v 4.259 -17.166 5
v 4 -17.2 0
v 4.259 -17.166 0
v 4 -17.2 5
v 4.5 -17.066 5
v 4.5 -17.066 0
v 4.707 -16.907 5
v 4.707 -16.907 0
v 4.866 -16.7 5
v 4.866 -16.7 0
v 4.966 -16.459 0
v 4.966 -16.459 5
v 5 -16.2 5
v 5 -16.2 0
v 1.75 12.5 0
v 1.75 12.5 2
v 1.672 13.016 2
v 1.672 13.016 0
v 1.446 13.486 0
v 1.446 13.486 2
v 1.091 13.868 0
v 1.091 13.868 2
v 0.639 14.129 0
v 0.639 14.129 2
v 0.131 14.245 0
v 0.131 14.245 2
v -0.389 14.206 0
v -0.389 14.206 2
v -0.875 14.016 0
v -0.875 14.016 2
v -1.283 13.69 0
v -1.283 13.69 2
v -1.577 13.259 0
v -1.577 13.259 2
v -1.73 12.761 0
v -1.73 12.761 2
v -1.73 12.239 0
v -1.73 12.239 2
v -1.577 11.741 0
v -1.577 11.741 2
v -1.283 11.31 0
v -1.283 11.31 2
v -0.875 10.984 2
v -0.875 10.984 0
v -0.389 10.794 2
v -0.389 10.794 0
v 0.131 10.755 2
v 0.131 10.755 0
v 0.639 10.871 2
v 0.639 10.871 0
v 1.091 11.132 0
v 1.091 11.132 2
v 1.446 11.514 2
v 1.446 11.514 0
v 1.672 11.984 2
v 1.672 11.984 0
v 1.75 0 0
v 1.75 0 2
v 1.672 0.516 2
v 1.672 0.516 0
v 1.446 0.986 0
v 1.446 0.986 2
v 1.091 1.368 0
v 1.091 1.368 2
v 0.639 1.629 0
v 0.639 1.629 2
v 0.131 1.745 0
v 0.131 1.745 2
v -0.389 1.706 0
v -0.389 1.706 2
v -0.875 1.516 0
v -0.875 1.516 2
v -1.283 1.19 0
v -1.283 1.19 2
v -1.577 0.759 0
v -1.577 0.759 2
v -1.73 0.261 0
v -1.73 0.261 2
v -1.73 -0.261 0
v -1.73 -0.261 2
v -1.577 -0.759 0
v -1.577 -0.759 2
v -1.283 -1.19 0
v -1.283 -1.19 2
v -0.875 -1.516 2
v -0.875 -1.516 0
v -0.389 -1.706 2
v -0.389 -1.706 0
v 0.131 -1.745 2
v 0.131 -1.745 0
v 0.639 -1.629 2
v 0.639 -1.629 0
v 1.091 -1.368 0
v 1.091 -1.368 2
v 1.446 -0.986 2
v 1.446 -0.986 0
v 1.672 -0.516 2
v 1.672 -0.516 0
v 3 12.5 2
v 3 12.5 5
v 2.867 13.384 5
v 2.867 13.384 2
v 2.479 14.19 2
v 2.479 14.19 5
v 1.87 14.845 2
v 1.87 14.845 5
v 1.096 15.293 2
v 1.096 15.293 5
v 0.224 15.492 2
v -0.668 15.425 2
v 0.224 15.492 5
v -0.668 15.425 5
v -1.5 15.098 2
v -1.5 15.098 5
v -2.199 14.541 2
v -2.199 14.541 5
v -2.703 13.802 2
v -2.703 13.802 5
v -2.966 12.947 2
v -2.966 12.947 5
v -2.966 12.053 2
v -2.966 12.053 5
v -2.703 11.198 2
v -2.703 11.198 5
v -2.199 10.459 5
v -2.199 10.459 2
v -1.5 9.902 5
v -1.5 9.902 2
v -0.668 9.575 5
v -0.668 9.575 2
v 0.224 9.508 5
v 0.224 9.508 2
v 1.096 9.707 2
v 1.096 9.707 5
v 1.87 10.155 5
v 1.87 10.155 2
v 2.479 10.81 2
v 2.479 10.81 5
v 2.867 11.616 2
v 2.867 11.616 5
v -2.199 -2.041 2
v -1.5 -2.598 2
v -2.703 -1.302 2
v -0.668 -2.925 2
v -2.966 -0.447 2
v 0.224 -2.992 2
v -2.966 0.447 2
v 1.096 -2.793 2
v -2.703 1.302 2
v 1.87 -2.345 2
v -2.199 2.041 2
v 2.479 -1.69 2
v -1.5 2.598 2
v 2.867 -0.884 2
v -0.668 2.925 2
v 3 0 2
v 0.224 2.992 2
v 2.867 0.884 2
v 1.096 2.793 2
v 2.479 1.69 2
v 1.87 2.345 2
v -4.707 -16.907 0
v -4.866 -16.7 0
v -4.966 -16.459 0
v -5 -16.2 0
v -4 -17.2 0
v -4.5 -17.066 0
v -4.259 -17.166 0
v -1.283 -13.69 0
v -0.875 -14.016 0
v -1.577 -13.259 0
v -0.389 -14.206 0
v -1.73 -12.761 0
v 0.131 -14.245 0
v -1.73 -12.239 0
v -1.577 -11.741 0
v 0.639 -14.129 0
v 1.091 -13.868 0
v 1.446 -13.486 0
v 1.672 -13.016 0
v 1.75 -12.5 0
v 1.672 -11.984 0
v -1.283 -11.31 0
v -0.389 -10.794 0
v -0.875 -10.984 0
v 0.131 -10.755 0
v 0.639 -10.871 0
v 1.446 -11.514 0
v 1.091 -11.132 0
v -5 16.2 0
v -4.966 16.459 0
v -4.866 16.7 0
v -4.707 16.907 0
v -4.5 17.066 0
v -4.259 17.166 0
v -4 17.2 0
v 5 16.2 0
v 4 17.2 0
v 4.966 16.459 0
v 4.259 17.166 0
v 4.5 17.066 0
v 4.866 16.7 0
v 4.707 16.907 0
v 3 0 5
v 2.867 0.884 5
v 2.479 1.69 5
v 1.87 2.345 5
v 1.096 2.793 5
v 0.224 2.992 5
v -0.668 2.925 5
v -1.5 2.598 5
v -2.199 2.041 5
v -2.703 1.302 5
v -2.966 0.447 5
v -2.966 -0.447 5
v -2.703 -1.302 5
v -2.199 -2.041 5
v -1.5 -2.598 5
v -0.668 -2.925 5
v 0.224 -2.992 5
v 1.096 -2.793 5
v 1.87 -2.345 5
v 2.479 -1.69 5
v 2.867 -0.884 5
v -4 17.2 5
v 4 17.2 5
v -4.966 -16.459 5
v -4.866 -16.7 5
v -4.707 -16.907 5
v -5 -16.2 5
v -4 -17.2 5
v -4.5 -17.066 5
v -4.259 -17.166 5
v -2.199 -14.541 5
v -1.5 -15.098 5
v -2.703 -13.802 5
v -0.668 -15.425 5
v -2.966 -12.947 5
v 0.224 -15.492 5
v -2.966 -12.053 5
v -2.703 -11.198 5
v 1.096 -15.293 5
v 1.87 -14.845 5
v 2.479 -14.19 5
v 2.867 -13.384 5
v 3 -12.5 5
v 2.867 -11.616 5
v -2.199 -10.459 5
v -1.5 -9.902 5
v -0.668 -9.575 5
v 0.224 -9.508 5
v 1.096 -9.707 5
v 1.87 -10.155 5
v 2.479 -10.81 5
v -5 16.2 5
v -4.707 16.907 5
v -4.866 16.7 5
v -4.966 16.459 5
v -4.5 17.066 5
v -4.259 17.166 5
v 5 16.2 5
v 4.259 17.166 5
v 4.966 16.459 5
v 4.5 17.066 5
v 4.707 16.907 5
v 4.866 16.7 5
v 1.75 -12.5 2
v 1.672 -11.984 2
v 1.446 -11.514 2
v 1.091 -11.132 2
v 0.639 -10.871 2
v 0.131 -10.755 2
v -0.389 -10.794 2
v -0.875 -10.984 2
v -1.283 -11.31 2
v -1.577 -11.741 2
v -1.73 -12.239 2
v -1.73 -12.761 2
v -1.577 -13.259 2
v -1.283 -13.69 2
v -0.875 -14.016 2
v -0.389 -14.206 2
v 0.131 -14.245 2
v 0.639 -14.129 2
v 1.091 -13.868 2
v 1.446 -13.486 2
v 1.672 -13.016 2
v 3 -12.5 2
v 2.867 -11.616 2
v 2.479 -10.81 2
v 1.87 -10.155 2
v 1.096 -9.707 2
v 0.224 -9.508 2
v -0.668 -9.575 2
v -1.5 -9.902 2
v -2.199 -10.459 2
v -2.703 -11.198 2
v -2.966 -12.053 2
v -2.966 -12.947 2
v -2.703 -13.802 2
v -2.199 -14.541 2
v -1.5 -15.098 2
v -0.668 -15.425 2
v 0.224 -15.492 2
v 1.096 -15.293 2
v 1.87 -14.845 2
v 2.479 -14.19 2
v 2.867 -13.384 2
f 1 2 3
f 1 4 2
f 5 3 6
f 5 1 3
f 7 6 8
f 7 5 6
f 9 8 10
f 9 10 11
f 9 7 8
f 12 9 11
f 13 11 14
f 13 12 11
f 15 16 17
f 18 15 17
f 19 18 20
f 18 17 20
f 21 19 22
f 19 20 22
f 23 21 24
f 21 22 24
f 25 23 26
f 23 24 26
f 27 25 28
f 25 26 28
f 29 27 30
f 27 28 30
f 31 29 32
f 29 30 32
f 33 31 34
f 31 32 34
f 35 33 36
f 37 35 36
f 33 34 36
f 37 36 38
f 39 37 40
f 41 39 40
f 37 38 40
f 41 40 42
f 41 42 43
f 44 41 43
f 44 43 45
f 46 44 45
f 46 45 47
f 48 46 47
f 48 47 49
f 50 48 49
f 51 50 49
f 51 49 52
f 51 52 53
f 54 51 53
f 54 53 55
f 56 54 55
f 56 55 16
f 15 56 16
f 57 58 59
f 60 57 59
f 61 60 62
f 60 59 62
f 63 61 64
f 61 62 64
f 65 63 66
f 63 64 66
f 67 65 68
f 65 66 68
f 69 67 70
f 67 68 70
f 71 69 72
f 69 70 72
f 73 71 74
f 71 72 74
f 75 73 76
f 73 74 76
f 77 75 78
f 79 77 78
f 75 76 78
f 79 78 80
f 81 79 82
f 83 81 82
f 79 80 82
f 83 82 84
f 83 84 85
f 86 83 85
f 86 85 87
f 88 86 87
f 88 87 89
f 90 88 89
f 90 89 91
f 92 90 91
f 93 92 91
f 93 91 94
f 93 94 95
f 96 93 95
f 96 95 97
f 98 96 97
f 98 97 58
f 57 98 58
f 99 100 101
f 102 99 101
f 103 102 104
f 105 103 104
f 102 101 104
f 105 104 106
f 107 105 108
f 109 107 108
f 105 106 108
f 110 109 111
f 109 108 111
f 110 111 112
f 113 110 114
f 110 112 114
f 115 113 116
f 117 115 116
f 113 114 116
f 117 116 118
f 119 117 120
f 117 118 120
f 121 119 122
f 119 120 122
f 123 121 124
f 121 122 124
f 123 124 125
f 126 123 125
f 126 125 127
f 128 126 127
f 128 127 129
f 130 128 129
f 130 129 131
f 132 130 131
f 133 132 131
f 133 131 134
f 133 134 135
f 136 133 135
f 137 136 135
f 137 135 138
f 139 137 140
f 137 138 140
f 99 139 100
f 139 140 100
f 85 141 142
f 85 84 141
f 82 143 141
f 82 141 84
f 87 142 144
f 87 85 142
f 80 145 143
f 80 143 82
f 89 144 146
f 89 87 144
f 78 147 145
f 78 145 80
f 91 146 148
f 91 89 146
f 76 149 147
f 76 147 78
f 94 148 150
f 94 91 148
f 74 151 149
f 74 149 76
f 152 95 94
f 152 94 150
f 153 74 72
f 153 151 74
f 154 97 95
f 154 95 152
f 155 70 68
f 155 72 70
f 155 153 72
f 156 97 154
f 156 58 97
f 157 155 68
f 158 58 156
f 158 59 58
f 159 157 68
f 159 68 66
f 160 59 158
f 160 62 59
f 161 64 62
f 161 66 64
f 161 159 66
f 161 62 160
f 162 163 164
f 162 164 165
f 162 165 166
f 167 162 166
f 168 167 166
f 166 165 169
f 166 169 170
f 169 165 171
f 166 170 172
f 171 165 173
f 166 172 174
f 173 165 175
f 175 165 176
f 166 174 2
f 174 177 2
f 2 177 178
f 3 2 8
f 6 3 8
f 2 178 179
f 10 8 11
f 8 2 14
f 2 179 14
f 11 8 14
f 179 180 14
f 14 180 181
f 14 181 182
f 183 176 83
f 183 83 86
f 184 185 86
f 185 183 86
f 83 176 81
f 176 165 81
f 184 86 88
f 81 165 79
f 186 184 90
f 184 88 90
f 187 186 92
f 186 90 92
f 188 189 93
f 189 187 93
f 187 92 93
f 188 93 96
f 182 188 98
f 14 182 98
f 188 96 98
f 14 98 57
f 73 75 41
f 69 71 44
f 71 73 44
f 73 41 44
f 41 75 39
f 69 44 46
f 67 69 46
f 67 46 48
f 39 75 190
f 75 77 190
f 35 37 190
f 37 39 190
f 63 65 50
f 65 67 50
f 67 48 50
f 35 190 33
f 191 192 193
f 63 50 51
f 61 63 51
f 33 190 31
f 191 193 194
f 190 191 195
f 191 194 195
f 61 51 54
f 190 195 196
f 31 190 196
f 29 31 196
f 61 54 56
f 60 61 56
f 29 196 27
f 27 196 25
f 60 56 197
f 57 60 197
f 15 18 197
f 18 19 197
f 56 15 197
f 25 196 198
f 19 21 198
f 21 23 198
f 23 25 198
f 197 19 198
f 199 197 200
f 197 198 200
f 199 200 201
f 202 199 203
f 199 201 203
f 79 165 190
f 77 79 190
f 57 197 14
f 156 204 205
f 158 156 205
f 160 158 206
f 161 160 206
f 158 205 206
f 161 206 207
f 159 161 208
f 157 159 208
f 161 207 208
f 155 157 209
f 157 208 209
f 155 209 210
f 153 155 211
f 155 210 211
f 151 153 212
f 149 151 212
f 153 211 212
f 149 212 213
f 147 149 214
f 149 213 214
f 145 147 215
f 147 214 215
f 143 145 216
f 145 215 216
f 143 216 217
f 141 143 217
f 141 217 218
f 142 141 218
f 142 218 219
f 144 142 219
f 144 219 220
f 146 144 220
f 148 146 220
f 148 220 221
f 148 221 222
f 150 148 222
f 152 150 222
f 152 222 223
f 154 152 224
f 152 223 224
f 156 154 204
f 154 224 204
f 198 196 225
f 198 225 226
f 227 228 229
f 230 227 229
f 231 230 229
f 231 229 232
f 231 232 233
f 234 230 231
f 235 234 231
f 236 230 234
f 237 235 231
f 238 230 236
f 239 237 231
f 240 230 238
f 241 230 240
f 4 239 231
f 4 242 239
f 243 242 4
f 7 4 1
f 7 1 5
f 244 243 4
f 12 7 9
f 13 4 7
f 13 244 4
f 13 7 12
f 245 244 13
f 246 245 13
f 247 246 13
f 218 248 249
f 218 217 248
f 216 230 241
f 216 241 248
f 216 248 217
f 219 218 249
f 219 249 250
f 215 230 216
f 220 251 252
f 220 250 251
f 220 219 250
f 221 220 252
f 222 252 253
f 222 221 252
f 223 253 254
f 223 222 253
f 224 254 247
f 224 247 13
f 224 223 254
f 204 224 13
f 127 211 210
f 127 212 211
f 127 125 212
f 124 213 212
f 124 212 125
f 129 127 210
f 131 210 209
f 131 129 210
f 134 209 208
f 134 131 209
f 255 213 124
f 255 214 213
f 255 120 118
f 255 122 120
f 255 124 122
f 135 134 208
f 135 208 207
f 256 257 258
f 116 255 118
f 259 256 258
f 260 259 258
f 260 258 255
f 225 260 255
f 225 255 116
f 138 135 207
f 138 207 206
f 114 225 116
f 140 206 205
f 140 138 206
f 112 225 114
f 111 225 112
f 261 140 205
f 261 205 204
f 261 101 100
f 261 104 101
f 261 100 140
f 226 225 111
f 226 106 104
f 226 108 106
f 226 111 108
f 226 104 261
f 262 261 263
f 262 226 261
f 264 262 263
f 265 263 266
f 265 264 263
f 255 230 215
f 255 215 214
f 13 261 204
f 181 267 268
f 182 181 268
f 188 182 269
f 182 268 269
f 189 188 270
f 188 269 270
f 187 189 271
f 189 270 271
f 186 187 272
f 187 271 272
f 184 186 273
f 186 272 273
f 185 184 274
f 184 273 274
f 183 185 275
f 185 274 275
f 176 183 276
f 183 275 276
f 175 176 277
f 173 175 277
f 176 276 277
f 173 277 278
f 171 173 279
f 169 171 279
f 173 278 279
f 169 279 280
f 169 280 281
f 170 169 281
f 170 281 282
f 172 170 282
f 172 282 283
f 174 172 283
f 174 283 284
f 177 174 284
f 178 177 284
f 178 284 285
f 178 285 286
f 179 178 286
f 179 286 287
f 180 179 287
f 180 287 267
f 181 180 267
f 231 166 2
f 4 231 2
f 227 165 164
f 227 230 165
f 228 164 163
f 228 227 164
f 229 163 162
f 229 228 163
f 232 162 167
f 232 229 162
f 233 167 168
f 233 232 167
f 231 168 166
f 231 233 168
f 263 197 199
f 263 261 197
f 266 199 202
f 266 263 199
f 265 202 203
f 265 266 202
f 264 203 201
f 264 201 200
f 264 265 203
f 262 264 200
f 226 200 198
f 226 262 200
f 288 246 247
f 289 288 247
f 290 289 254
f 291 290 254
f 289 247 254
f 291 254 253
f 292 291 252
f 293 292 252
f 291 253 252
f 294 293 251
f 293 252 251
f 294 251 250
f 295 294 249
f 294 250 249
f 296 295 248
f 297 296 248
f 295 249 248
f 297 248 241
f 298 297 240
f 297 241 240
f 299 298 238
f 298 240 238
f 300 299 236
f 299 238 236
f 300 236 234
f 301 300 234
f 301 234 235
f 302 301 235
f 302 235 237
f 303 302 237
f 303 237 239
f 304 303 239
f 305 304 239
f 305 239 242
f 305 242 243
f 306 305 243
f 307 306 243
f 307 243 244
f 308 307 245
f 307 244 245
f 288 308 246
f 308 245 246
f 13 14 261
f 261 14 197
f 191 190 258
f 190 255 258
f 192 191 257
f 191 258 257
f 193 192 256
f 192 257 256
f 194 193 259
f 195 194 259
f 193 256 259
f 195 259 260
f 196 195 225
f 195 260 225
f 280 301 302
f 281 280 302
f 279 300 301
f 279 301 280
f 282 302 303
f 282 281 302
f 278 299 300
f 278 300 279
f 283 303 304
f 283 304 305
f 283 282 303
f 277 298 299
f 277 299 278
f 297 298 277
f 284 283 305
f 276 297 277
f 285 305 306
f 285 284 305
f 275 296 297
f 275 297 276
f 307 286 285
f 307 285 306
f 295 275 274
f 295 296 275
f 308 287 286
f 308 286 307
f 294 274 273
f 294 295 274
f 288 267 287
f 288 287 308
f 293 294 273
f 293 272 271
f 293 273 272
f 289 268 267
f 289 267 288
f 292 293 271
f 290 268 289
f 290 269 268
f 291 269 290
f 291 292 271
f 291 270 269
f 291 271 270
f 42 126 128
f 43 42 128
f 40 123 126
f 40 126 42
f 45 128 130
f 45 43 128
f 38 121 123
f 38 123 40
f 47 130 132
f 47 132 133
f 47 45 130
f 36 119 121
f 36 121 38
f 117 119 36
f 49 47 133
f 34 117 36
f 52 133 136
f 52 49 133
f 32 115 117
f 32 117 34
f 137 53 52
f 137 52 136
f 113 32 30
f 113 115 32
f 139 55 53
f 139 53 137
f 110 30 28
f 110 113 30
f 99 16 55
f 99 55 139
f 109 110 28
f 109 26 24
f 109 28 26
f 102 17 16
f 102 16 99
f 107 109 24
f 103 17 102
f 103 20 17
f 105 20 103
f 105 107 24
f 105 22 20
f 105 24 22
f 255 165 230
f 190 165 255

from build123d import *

# Parameters (mm, degrees)
SKETCH1_W           = 10
SKETCH1_H           = 34.4
BOSS_EXTRUDE1_DEPTH = 5
FILLET1_R           = 1
SKETCH4_R           = 1.75
CUT_EXTRUDE1_DEPTH  = 5
SKETCH5_R           = 3
CUT_EXTRUDE2_DEPTH  = 3


with BuildPart() as part:
    # Sketch1 → Boss-Extrude1 (new body)
    with BuildSketch(Plane.XY):
        Rectangle(SKETCH1_W, SKETCH1_H)
    extrude(amount=BOSS_EXTRUDE1_DEPTH)

    # Fillet1
    fillet1_edges = [part.edges().sort_by_distance(p)[0] for p in [
        (-5, 17.2, 2.5),
        (5, 17.2, 2.5),
        (5, -17.2, 2.5),
        (-5, -17.2, 2.5),
    ]]
    fillet(fillet1_edges, radius=FILLET1_R)

    # Sketch4 → Cut-Extrude1 (cut)
    with BuildSketch(Plane.XY.offset(5)):
        Circle(SKETCH4_R)
        with Locations((0, 12.5)):
            Circle(SKETCH4_R)
        with Locations((0, -12.5)):
            Circle(SKETCH4_R)
    extrude(amount=-CUT_EXTRUDE1_DEPTH, mode=Mode.SUBTRACT)

    # Sketch5 → Cut-Extrude2 (cut)
    with BuildSketch(Plane.XY.offset(5)):
        with Locations((0, 12.5)):
            Circle(SKETCH5_R)
        Circle(SKETCH5_R)
        with Locations((0, -12.5)):
            Circle(SKETCH5_R)
    extrude(amount=-CUT_EXTRUDE2_DEPTH, mode=Mode.SUBTRACT)


solid = part.part
